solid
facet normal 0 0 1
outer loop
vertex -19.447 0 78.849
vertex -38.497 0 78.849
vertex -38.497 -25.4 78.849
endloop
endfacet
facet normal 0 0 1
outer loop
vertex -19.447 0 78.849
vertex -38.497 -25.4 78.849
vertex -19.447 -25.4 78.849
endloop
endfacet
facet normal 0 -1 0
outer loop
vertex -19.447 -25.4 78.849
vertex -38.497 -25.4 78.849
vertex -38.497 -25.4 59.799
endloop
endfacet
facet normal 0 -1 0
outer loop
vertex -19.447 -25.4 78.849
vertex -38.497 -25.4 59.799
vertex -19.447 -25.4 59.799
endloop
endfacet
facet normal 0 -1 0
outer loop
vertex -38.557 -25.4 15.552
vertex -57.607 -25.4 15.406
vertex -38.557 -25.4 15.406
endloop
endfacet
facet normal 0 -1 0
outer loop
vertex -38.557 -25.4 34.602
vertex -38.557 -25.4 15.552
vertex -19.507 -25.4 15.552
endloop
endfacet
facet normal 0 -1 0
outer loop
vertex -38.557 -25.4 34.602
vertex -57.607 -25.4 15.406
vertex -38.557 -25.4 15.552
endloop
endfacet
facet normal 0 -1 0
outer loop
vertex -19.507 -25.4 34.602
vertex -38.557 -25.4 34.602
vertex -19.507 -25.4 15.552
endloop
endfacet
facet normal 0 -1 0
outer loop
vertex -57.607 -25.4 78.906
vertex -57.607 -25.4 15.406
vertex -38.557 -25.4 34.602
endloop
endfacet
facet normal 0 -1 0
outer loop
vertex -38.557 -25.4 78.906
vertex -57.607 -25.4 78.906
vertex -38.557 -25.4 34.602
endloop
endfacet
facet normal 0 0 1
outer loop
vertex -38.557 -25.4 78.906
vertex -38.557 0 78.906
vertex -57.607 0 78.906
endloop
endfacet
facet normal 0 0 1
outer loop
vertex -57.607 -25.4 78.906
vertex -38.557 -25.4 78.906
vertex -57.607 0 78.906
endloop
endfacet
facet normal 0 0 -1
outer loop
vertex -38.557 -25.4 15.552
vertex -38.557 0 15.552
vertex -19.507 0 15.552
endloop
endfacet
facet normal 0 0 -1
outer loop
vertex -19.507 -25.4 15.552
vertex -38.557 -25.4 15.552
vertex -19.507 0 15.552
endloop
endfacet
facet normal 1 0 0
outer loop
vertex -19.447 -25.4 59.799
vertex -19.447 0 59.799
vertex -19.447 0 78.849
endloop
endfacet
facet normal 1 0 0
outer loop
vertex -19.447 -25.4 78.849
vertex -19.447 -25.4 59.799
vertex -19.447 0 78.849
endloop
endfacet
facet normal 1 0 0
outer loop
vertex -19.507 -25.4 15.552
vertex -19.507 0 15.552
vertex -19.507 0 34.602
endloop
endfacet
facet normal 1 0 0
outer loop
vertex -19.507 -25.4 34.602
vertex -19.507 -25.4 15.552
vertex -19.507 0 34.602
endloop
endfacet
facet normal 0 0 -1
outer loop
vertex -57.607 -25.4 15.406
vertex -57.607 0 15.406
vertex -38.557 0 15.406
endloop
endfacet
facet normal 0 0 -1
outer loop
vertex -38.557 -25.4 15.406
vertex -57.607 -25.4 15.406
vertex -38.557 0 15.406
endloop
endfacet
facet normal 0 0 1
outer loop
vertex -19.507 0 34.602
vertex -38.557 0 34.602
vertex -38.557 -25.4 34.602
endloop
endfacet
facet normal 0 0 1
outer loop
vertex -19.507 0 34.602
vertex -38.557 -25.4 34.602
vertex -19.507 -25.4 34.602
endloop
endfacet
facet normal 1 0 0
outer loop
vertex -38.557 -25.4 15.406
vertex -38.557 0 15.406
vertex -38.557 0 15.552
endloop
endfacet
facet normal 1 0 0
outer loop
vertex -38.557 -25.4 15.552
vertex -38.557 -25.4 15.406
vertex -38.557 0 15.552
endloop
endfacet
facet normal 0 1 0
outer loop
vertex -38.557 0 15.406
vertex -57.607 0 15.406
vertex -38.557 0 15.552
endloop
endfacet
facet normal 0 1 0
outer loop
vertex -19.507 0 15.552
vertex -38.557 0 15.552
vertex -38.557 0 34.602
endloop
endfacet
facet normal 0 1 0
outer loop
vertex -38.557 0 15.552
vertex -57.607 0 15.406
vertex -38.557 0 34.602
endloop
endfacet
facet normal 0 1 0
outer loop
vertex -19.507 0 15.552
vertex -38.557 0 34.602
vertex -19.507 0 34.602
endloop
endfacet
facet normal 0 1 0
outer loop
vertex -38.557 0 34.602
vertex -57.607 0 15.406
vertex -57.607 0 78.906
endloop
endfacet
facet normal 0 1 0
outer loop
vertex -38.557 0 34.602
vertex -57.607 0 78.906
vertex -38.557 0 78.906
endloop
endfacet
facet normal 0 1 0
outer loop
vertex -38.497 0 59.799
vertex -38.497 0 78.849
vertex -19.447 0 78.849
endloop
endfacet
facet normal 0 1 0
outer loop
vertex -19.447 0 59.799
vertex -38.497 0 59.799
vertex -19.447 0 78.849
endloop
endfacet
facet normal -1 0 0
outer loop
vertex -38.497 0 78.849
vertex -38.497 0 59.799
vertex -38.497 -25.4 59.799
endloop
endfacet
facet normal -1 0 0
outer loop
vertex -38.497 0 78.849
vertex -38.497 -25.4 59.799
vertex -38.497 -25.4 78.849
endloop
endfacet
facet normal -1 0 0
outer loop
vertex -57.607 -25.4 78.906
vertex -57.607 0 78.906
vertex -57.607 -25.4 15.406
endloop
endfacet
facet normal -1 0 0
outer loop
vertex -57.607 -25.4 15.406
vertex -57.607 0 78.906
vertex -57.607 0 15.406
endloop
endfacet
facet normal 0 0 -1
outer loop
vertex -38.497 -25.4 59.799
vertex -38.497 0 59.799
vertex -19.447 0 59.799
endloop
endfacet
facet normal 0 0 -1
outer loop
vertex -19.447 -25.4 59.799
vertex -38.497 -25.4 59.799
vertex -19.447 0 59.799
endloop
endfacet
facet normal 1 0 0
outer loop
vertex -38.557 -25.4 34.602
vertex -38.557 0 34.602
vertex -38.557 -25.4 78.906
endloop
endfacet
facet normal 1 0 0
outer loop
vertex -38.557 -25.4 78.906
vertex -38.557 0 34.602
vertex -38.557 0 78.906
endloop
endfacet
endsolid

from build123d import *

# Parameters (mm, degrees)
F0_W     = 19.05
F0_H     = 19.05
F1_DEPTH = 25.4


with BuildPart() as f1:
    # F0 (on Front) → F1 (new body)
    with BuildSketch(Plane.XZ):
        Polygon((-57.607489, 15.406334), (-38.557489, 15.406334), (-38.557489, 15.551562), (-38.557489, 34.601562), (-38.557489, 78.906334), (-57.607489, 78.906334), align=None)
        with Locations((-29.032489, 25.076562)):
            Rectangle(F0_W, F0_H)
        with Locations((-28.971859, 69.324278)):
            Rectangle(F0_W, F0_H)
    extrude(amount=F1_DEPTH)


solid = f1.part
